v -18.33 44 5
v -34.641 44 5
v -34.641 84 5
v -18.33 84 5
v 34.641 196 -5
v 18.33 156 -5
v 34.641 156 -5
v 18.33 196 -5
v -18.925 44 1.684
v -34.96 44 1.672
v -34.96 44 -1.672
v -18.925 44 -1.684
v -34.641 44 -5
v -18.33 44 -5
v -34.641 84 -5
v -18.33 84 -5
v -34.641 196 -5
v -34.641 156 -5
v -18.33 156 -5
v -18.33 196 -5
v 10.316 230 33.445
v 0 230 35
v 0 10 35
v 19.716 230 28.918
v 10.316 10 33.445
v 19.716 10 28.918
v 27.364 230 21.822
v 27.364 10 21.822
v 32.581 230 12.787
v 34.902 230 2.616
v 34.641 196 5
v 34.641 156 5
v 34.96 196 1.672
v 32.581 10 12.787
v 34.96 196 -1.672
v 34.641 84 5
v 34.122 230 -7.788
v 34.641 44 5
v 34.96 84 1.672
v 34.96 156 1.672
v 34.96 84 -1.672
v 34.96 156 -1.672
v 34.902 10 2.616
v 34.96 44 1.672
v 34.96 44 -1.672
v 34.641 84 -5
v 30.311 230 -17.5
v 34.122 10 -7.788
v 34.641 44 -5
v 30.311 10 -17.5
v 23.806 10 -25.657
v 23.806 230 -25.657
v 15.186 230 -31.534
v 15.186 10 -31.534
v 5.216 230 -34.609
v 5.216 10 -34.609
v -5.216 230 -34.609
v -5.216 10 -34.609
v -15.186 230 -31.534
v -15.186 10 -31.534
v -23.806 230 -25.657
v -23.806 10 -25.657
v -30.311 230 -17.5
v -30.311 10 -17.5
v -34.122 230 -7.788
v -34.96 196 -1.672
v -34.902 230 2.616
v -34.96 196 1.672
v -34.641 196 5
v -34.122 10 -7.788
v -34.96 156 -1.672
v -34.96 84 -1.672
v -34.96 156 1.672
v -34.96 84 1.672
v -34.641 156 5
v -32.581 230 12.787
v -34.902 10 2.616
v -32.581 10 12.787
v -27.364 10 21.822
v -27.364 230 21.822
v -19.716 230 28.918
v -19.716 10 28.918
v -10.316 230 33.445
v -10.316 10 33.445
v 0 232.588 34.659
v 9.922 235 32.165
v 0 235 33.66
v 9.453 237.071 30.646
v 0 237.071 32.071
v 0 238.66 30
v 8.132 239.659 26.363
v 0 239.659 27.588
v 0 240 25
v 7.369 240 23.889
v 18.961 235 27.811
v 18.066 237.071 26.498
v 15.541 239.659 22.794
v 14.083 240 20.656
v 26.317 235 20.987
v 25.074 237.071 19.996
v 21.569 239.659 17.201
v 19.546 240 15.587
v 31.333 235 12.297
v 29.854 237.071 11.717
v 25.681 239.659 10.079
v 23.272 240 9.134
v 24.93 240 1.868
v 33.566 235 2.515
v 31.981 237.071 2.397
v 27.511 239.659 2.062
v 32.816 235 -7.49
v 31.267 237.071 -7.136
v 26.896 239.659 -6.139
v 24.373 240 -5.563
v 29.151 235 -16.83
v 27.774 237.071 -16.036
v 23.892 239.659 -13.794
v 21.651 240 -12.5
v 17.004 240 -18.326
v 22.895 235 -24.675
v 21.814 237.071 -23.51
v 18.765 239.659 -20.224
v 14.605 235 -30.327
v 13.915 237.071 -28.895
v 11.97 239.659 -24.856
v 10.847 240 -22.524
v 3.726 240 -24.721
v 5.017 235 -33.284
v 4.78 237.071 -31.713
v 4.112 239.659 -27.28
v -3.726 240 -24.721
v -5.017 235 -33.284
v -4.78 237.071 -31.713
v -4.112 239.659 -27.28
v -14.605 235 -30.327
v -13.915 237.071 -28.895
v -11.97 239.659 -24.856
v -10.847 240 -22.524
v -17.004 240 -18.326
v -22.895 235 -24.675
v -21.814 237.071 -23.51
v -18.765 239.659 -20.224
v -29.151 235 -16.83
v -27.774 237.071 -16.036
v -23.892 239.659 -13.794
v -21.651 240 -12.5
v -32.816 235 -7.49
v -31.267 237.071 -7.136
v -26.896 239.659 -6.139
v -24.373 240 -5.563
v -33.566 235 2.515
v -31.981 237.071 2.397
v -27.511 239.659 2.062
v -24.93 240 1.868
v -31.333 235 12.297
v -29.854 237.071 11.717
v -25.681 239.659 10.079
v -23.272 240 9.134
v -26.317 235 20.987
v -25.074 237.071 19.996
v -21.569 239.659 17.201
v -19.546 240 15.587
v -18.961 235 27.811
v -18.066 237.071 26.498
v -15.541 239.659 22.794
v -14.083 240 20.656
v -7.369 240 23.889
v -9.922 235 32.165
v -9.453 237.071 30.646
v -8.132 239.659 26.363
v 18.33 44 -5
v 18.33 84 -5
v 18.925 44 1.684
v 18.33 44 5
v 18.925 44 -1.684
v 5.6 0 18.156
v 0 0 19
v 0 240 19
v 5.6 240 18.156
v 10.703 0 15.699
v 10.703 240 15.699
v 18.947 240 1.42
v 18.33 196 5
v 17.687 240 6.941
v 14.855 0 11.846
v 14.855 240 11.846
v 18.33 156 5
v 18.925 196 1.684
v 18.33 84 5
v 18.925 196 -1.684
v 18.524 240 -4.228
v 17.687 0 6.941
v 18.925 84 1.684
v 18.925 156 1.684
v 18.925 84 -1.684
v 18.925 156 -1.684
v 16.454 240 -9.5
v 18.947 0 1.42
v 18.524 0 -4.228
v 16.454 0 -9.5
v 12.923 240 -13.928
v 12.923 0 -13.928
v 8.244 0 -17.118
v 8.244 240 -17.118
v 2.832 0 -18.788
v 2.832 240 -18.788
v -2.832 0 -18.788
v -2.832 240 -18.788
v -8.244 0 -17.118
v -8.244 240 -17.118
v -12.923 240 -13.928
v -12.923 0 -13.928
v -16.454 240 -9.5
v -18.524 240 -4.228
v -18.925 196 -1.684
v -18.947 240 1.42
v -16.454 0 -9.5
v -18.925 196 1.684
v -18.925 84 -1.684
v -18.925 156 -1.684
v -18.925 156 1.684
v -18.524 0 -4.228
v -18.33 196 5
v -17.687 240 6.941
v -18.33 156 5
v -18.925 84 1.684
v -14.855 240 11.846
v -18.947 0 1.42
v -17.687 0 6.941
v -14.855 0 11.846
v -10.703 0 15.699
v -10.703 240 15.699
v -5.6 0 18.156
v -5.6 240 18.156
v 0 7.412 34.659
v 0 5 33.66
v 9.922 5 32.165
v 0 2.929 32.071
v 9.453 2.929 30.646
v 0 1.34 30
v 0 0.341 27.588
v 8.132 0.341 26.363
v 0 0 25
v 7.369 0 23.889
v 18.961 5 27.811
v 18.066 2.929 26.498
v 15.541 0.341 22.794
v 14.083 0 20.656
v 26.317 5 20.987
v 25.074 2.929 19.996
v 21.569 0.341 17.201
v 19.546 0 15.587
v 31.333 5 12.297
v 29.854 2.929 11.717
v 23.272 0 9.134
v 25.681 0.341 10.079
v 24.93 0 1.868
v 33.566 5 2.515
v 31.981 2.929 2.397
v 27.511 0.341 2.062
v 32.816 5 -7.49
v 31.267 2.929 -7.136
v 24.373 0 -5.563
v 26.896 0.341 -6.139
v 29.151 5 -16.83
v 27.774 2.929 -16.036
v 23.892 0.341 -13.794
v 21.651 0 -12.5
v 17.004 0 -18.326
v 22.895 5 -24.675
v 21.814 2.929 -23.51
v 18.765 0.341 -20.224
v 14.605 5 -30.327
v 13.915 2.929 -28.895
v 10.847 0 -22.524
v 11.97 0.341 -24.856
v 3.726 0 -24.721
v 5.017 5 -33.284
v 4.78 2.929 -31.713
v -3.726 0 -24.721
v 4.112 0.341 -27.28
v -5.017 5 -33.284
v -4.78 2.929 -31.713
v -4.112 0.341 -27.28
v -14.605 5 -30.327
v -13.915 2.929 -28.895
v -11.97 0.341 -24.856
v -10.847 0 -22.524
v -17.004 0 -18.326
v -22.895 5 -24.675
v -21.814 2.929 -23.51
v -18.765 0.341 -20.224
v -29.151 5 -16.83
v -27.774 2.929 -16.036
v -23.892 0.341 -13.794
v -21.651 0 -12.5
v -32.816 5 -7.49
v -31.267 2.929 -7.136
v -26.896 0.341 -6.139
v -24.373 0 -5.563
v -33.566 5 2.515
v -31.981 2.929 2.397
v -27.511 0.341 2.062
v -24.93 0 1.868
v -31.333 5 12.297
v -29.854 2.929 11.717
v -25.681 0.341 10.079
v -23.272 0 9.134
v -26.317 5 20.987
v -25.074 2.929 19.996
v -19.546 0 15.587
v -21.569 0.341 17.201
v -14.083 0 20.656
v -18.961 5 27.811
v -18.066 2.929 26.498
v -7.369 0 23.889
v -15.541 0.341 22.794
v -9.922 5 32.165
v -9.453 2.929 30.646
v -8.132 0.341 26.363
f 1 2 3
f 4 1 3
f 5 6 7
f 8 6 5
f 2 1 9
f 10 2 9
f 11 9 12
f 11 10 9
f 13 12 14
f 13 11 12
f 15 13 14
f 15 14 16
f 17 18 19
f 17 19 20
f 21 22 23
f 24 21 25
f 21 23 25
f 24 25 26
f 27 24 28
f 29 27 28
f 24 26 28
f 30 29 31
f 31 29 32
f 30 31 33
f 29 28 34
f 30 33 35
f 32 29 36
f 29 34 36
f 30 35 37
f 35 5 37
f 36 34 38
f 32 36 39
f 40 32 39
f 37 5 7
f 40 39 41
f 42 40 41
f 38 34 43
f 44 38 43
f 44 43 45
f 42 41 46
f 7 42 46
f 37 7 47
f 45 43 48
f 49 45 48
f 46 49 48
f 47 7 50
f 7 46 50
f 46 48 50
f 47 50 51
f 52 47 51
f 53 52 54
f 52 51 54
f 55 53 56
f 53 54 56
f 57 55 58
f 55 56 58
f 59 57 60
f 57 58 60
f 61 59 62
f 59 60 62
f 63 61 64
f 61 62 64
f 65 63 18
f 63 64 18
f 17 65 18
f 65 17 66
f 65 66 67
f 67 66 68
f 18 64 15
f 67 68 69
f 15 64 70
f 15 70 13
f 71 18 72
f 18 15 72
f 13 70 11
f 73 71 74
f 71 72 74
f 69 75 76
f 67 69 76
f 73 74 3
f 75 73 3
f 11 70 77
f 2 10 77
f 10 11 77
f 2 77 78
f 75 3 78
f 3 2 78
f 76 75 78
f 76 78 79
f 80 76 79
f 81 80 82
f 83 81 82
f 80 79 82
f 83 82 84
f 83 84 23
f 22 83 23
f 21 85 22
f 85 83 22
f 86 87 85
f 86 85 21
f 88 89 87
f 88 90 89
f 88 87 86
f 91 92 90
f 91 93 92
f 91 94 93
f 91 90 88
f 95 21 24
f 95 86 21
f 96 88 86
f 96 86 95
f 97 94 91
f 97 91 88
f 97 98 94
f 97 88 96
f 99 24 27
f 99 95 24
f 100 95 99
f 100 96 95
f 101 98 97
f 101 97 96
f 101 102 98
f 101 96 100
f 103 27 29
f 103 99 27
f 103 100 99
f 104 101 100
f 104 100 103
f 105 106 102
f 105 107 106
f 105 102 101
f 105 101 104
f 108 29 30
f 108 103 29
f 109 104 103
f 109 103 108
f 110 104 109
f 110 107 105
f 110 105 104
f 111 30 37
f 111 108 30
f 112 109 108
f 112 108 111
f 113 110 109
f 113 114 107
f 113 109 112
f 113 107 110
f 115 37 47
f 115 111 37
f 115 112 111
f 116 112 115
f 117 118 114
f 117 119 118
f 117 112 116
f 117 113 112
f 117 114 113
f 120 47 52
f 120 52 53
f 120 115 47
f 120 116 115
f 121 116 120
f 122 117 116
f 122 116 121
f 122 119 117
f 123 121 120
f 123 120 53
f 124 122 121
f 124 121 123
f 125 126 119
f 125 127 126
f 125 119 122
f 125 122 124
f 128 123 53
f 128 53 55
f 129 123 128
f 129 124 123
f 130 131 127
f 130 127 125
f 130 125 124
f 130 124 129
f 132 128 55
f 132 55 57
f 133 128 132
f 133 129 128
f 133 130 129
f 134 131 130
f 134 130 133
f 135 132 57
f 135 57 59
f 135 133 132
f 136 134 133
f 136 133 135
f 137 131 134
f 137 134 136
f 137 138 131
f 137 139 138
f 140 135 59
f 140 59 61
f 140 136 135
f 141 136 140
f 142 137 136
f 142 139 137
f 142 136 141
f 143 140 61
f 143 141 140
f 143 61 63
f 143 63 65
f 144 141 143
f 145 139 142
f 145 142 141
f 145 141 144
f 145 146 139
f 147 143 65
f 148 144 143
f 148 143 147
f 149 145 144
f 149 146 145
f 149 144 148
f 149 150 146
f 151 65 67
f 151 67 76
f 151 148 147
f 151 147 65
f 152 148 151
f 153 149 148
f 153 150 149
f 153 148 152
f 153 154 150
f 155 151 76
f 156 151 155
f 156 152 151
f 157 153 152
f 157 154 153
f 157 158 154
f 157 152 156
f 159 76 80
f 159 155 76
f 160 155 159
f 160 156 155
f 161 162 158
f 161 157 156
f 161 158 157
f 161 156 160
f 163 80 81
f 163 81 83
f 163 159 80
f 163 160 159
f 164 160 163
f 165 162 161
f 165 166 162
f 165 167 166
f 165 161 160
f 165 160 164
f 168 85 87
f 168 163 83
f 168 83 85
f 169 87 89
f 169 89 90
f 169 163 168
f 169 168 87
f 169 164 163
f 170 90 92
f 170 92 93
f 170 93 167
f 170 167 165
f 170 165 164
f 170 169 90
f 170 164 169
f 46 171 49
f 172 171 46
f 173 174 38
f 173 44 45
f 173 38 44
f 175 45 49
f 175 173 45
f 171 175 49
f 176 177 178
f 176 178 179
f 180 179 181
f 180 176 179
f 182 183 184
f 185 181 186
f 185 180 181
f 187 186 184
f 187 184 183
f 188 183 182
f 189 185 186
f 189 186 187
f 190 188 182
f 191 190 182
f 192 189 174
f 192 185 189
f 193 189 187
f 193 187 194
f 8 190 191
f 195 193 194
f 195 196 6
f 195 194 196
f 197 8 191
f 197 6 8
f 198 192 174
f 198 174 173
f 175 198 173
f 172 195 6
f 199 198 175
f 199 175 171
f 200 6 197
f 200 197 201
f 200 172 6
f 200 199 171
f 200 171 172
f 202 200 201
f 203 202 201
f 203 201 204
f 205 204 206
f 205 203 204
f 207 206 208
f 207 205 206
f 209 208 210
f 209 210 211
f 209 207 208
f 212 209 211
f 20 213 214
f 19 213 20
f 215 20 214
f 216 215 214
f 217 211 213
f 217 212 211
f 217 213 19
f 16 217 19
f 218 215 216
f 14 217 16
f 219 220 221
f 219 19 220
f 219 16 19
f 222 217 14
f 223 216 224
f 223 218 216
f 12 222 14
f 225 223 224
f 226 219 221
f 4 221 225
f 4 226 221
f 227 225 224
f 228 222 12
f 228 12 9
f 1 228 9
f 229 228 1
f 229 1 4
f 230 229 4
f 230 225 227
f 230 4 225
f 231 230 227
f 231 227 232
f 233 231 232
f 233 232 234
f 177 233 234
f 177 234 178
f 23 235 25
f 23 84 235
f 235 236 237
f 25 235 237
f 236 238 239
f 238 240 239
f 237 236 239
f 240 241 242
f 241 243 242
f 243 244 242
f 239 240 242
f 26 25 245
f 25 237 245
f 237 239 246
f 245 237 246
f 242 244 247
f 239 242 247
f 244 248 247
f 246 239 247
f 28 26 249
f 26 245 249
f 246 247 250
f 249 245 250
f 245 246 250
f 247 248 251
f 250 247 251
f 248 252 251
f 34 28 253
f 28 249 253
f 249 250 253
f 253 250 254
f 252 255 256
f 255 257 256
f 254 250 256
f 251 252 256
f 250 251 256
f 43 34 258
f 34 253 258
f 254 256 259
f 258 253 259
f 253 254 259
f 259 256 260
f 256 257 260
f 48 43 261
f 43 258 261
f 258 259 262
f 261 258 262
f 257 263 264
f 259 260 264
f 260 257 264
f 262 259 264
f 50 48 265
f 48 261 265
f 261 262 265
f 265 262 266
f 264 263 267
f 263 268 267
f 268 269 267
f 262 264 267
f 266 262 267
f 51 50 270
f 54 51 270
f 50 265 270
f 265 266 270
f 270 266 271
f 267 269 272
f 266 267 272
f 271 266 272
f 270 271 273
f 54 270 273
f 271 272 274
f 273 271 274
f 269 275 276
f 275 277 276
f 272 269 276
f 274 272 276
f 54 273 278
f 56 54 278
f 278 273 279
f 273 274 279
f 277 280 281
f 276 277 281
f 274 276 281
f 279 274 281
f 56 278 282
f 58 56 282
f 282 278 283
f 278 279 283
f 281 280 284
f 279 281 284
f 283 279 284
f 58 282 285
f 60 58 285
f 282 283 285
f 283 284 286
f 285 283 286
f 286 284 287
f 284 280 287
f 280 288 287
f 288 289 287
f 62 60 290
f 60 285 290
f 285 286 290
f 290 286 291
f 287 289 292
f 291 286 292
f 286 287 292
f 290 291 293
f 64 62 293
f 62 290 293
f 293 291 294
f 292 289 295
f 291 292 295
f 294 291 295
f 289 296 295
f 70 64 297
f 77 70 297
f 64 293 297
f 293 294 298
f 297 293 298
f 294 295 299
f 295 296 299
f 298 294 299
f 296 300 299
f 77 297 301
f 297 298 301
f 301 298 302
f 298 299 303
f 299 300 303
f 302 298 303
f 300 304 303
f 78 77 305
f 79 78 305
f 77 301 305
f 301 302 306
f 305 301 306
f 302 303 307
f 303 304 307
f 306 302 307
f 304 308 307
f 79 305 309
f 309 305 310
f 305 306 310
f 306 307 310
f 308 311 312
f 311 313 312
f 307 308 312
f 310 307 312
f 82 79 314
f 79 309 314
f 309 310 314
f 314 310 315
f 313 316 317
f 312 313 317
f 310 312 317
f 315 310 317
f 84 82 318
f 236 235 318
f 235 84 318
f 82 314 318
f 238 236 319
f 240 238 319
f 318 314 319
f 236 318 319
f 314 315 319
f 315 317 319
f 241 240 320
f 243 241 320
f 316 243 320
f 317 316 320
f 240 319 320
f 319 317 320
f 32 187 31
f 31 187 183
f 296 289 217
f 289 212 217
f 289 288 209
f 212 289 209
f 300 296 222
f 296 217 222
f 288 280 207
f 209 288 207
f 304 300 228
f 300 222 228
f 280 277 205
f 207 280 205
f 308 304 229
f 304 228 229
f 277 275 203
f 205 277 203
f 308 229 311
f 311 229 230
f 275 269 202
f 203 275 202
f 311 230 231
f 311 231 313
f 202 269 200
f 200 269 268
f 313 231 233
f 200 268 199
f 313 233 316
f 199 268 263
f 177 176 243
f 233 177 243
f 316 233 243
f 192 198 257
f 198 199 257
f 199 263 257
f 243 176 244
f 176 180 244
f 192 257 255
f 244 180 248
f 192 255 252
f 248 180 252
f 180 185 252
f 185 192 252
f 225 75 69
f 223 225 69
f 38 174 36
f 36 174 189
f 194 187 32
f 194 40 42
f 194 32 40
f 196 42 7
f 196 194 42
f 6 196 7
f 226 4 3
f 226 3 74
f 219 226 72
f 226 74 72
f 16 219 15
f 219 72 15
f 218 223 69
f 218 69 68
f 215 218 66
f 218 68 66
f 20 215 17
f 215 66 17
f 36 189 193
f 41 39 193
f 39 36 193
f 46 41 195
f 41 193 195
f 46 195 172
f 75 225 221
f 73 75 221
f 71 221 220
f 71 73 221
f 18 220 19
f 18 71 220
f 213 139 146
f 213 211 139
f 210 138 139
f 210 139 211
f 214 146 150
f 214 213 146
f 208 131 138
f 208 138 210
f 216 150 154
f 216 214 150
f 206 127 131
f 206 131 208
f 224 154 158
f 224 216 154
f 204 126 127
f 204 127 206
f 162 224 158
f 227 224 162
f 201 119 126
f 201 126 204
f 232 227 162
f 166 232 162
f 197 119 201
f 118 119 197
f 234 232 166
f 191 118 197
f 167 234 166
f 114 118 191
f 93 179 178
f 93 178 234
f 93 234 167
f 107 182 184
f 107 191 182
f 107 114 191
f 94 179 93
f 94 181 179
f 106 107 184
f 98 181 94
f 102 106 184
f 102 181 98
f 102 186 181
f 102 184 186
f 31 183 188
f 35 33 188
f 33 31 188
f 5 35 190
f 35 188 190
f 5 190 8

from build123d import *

# Parameters (mm, degrees)
SKETCH3_R               = 35
SKETCH3_R_2             = 19
BOSS_EXTRUDE2_DEPTH     = 240
CUT_EXTRUDE2_DEPTH      = 246.051015097
CUT_EXTRUDE2_DEPTH_BACK = 246.051015097
SKETCH5_W               = 10
SKETCH5_H               = 40
CUT_EXTRUDE3_DEPTH      = 246.051015097
CUT_EXTRUDE3_DEPTH_BACK = 246.051015097
SKETCH6_W               = 10
SKETCH6_H               = 40
FILLET2_R               = 10
FILLET3_R               = 10


with BuildPart() as part:
    # Sketch3 → Boss-Extrude2 (new body)
    with BuildSketch(Plane(origin=(0, 0, 0), x_dir=(1, 0, 0), z_dir=(0, 1, 0))):
        with Locations(Location((0, 0, 0), (0, 0, 270))):
            Circle(SKETCH3_R)
        with Locations(Location((0, 0, 0), (0, 0, 270))):
            Circle(SKETCH3_R_2, mode=Mode.SUBTRACT)
    extrude(amount=BOSS_EXTRUDE2_DEPTH)

    # Sketch5 → Cut-Extrude2 (cut, two sides: drawn at the far end of the back side and taken through both)
    with BuildSketch(Plane(origin=(0, 0, 0), x_dir=(0, 0, -1), z_dir=(1, 0, 0)).offset(-CUT_EXTRUDE2_DEPTH_BACK)):
        with Locations((0, 176)):
            Rectangle(SKETCH5_W, SKETCH5_H)
    extrude(amount=CUT_EXTRUDE2_DEPTH + CUT_EXTRUDE2_DEPTH_BACK, mode=Mode.SUBTRACT)

    # Sketch6 → Cut-Extrude3 (cut, two sides: drawn at the far end of the back side and taken through both)
    with BuildSketch(Plane(origin=(0, 0, 0), x_dir=(0, 0, -1), z_dir=(1, 0, 0)).offset(-CUT_EXTRUDE3_DEPTH_BACK)):
        with Locations((0, 64)):
            Rectangle(SKETCH6_W, SKETCH6_H)
    extrude(amount=CUT_EXTRUDE3_DEPTH + CUT_EXTRUDE3_DEPTH_BACK, mode=Mode.SUBTRACT)

    # Fillet2
    fillet2_edges = [part.edges().sort_by_distance(p)[0] for p in [
        (0, 240, -35),
    ]]
    fillet(fillet2_edges, radius=FILLET2_R)

    # Fillet3
    fillet3_edges = [part.edges().sort_by_distance(p)[0] for p in [
        (0, 0, -35),
    ]]
    fillet(fillet3_edges, radius=FILLET3_R)


solid = part.part
